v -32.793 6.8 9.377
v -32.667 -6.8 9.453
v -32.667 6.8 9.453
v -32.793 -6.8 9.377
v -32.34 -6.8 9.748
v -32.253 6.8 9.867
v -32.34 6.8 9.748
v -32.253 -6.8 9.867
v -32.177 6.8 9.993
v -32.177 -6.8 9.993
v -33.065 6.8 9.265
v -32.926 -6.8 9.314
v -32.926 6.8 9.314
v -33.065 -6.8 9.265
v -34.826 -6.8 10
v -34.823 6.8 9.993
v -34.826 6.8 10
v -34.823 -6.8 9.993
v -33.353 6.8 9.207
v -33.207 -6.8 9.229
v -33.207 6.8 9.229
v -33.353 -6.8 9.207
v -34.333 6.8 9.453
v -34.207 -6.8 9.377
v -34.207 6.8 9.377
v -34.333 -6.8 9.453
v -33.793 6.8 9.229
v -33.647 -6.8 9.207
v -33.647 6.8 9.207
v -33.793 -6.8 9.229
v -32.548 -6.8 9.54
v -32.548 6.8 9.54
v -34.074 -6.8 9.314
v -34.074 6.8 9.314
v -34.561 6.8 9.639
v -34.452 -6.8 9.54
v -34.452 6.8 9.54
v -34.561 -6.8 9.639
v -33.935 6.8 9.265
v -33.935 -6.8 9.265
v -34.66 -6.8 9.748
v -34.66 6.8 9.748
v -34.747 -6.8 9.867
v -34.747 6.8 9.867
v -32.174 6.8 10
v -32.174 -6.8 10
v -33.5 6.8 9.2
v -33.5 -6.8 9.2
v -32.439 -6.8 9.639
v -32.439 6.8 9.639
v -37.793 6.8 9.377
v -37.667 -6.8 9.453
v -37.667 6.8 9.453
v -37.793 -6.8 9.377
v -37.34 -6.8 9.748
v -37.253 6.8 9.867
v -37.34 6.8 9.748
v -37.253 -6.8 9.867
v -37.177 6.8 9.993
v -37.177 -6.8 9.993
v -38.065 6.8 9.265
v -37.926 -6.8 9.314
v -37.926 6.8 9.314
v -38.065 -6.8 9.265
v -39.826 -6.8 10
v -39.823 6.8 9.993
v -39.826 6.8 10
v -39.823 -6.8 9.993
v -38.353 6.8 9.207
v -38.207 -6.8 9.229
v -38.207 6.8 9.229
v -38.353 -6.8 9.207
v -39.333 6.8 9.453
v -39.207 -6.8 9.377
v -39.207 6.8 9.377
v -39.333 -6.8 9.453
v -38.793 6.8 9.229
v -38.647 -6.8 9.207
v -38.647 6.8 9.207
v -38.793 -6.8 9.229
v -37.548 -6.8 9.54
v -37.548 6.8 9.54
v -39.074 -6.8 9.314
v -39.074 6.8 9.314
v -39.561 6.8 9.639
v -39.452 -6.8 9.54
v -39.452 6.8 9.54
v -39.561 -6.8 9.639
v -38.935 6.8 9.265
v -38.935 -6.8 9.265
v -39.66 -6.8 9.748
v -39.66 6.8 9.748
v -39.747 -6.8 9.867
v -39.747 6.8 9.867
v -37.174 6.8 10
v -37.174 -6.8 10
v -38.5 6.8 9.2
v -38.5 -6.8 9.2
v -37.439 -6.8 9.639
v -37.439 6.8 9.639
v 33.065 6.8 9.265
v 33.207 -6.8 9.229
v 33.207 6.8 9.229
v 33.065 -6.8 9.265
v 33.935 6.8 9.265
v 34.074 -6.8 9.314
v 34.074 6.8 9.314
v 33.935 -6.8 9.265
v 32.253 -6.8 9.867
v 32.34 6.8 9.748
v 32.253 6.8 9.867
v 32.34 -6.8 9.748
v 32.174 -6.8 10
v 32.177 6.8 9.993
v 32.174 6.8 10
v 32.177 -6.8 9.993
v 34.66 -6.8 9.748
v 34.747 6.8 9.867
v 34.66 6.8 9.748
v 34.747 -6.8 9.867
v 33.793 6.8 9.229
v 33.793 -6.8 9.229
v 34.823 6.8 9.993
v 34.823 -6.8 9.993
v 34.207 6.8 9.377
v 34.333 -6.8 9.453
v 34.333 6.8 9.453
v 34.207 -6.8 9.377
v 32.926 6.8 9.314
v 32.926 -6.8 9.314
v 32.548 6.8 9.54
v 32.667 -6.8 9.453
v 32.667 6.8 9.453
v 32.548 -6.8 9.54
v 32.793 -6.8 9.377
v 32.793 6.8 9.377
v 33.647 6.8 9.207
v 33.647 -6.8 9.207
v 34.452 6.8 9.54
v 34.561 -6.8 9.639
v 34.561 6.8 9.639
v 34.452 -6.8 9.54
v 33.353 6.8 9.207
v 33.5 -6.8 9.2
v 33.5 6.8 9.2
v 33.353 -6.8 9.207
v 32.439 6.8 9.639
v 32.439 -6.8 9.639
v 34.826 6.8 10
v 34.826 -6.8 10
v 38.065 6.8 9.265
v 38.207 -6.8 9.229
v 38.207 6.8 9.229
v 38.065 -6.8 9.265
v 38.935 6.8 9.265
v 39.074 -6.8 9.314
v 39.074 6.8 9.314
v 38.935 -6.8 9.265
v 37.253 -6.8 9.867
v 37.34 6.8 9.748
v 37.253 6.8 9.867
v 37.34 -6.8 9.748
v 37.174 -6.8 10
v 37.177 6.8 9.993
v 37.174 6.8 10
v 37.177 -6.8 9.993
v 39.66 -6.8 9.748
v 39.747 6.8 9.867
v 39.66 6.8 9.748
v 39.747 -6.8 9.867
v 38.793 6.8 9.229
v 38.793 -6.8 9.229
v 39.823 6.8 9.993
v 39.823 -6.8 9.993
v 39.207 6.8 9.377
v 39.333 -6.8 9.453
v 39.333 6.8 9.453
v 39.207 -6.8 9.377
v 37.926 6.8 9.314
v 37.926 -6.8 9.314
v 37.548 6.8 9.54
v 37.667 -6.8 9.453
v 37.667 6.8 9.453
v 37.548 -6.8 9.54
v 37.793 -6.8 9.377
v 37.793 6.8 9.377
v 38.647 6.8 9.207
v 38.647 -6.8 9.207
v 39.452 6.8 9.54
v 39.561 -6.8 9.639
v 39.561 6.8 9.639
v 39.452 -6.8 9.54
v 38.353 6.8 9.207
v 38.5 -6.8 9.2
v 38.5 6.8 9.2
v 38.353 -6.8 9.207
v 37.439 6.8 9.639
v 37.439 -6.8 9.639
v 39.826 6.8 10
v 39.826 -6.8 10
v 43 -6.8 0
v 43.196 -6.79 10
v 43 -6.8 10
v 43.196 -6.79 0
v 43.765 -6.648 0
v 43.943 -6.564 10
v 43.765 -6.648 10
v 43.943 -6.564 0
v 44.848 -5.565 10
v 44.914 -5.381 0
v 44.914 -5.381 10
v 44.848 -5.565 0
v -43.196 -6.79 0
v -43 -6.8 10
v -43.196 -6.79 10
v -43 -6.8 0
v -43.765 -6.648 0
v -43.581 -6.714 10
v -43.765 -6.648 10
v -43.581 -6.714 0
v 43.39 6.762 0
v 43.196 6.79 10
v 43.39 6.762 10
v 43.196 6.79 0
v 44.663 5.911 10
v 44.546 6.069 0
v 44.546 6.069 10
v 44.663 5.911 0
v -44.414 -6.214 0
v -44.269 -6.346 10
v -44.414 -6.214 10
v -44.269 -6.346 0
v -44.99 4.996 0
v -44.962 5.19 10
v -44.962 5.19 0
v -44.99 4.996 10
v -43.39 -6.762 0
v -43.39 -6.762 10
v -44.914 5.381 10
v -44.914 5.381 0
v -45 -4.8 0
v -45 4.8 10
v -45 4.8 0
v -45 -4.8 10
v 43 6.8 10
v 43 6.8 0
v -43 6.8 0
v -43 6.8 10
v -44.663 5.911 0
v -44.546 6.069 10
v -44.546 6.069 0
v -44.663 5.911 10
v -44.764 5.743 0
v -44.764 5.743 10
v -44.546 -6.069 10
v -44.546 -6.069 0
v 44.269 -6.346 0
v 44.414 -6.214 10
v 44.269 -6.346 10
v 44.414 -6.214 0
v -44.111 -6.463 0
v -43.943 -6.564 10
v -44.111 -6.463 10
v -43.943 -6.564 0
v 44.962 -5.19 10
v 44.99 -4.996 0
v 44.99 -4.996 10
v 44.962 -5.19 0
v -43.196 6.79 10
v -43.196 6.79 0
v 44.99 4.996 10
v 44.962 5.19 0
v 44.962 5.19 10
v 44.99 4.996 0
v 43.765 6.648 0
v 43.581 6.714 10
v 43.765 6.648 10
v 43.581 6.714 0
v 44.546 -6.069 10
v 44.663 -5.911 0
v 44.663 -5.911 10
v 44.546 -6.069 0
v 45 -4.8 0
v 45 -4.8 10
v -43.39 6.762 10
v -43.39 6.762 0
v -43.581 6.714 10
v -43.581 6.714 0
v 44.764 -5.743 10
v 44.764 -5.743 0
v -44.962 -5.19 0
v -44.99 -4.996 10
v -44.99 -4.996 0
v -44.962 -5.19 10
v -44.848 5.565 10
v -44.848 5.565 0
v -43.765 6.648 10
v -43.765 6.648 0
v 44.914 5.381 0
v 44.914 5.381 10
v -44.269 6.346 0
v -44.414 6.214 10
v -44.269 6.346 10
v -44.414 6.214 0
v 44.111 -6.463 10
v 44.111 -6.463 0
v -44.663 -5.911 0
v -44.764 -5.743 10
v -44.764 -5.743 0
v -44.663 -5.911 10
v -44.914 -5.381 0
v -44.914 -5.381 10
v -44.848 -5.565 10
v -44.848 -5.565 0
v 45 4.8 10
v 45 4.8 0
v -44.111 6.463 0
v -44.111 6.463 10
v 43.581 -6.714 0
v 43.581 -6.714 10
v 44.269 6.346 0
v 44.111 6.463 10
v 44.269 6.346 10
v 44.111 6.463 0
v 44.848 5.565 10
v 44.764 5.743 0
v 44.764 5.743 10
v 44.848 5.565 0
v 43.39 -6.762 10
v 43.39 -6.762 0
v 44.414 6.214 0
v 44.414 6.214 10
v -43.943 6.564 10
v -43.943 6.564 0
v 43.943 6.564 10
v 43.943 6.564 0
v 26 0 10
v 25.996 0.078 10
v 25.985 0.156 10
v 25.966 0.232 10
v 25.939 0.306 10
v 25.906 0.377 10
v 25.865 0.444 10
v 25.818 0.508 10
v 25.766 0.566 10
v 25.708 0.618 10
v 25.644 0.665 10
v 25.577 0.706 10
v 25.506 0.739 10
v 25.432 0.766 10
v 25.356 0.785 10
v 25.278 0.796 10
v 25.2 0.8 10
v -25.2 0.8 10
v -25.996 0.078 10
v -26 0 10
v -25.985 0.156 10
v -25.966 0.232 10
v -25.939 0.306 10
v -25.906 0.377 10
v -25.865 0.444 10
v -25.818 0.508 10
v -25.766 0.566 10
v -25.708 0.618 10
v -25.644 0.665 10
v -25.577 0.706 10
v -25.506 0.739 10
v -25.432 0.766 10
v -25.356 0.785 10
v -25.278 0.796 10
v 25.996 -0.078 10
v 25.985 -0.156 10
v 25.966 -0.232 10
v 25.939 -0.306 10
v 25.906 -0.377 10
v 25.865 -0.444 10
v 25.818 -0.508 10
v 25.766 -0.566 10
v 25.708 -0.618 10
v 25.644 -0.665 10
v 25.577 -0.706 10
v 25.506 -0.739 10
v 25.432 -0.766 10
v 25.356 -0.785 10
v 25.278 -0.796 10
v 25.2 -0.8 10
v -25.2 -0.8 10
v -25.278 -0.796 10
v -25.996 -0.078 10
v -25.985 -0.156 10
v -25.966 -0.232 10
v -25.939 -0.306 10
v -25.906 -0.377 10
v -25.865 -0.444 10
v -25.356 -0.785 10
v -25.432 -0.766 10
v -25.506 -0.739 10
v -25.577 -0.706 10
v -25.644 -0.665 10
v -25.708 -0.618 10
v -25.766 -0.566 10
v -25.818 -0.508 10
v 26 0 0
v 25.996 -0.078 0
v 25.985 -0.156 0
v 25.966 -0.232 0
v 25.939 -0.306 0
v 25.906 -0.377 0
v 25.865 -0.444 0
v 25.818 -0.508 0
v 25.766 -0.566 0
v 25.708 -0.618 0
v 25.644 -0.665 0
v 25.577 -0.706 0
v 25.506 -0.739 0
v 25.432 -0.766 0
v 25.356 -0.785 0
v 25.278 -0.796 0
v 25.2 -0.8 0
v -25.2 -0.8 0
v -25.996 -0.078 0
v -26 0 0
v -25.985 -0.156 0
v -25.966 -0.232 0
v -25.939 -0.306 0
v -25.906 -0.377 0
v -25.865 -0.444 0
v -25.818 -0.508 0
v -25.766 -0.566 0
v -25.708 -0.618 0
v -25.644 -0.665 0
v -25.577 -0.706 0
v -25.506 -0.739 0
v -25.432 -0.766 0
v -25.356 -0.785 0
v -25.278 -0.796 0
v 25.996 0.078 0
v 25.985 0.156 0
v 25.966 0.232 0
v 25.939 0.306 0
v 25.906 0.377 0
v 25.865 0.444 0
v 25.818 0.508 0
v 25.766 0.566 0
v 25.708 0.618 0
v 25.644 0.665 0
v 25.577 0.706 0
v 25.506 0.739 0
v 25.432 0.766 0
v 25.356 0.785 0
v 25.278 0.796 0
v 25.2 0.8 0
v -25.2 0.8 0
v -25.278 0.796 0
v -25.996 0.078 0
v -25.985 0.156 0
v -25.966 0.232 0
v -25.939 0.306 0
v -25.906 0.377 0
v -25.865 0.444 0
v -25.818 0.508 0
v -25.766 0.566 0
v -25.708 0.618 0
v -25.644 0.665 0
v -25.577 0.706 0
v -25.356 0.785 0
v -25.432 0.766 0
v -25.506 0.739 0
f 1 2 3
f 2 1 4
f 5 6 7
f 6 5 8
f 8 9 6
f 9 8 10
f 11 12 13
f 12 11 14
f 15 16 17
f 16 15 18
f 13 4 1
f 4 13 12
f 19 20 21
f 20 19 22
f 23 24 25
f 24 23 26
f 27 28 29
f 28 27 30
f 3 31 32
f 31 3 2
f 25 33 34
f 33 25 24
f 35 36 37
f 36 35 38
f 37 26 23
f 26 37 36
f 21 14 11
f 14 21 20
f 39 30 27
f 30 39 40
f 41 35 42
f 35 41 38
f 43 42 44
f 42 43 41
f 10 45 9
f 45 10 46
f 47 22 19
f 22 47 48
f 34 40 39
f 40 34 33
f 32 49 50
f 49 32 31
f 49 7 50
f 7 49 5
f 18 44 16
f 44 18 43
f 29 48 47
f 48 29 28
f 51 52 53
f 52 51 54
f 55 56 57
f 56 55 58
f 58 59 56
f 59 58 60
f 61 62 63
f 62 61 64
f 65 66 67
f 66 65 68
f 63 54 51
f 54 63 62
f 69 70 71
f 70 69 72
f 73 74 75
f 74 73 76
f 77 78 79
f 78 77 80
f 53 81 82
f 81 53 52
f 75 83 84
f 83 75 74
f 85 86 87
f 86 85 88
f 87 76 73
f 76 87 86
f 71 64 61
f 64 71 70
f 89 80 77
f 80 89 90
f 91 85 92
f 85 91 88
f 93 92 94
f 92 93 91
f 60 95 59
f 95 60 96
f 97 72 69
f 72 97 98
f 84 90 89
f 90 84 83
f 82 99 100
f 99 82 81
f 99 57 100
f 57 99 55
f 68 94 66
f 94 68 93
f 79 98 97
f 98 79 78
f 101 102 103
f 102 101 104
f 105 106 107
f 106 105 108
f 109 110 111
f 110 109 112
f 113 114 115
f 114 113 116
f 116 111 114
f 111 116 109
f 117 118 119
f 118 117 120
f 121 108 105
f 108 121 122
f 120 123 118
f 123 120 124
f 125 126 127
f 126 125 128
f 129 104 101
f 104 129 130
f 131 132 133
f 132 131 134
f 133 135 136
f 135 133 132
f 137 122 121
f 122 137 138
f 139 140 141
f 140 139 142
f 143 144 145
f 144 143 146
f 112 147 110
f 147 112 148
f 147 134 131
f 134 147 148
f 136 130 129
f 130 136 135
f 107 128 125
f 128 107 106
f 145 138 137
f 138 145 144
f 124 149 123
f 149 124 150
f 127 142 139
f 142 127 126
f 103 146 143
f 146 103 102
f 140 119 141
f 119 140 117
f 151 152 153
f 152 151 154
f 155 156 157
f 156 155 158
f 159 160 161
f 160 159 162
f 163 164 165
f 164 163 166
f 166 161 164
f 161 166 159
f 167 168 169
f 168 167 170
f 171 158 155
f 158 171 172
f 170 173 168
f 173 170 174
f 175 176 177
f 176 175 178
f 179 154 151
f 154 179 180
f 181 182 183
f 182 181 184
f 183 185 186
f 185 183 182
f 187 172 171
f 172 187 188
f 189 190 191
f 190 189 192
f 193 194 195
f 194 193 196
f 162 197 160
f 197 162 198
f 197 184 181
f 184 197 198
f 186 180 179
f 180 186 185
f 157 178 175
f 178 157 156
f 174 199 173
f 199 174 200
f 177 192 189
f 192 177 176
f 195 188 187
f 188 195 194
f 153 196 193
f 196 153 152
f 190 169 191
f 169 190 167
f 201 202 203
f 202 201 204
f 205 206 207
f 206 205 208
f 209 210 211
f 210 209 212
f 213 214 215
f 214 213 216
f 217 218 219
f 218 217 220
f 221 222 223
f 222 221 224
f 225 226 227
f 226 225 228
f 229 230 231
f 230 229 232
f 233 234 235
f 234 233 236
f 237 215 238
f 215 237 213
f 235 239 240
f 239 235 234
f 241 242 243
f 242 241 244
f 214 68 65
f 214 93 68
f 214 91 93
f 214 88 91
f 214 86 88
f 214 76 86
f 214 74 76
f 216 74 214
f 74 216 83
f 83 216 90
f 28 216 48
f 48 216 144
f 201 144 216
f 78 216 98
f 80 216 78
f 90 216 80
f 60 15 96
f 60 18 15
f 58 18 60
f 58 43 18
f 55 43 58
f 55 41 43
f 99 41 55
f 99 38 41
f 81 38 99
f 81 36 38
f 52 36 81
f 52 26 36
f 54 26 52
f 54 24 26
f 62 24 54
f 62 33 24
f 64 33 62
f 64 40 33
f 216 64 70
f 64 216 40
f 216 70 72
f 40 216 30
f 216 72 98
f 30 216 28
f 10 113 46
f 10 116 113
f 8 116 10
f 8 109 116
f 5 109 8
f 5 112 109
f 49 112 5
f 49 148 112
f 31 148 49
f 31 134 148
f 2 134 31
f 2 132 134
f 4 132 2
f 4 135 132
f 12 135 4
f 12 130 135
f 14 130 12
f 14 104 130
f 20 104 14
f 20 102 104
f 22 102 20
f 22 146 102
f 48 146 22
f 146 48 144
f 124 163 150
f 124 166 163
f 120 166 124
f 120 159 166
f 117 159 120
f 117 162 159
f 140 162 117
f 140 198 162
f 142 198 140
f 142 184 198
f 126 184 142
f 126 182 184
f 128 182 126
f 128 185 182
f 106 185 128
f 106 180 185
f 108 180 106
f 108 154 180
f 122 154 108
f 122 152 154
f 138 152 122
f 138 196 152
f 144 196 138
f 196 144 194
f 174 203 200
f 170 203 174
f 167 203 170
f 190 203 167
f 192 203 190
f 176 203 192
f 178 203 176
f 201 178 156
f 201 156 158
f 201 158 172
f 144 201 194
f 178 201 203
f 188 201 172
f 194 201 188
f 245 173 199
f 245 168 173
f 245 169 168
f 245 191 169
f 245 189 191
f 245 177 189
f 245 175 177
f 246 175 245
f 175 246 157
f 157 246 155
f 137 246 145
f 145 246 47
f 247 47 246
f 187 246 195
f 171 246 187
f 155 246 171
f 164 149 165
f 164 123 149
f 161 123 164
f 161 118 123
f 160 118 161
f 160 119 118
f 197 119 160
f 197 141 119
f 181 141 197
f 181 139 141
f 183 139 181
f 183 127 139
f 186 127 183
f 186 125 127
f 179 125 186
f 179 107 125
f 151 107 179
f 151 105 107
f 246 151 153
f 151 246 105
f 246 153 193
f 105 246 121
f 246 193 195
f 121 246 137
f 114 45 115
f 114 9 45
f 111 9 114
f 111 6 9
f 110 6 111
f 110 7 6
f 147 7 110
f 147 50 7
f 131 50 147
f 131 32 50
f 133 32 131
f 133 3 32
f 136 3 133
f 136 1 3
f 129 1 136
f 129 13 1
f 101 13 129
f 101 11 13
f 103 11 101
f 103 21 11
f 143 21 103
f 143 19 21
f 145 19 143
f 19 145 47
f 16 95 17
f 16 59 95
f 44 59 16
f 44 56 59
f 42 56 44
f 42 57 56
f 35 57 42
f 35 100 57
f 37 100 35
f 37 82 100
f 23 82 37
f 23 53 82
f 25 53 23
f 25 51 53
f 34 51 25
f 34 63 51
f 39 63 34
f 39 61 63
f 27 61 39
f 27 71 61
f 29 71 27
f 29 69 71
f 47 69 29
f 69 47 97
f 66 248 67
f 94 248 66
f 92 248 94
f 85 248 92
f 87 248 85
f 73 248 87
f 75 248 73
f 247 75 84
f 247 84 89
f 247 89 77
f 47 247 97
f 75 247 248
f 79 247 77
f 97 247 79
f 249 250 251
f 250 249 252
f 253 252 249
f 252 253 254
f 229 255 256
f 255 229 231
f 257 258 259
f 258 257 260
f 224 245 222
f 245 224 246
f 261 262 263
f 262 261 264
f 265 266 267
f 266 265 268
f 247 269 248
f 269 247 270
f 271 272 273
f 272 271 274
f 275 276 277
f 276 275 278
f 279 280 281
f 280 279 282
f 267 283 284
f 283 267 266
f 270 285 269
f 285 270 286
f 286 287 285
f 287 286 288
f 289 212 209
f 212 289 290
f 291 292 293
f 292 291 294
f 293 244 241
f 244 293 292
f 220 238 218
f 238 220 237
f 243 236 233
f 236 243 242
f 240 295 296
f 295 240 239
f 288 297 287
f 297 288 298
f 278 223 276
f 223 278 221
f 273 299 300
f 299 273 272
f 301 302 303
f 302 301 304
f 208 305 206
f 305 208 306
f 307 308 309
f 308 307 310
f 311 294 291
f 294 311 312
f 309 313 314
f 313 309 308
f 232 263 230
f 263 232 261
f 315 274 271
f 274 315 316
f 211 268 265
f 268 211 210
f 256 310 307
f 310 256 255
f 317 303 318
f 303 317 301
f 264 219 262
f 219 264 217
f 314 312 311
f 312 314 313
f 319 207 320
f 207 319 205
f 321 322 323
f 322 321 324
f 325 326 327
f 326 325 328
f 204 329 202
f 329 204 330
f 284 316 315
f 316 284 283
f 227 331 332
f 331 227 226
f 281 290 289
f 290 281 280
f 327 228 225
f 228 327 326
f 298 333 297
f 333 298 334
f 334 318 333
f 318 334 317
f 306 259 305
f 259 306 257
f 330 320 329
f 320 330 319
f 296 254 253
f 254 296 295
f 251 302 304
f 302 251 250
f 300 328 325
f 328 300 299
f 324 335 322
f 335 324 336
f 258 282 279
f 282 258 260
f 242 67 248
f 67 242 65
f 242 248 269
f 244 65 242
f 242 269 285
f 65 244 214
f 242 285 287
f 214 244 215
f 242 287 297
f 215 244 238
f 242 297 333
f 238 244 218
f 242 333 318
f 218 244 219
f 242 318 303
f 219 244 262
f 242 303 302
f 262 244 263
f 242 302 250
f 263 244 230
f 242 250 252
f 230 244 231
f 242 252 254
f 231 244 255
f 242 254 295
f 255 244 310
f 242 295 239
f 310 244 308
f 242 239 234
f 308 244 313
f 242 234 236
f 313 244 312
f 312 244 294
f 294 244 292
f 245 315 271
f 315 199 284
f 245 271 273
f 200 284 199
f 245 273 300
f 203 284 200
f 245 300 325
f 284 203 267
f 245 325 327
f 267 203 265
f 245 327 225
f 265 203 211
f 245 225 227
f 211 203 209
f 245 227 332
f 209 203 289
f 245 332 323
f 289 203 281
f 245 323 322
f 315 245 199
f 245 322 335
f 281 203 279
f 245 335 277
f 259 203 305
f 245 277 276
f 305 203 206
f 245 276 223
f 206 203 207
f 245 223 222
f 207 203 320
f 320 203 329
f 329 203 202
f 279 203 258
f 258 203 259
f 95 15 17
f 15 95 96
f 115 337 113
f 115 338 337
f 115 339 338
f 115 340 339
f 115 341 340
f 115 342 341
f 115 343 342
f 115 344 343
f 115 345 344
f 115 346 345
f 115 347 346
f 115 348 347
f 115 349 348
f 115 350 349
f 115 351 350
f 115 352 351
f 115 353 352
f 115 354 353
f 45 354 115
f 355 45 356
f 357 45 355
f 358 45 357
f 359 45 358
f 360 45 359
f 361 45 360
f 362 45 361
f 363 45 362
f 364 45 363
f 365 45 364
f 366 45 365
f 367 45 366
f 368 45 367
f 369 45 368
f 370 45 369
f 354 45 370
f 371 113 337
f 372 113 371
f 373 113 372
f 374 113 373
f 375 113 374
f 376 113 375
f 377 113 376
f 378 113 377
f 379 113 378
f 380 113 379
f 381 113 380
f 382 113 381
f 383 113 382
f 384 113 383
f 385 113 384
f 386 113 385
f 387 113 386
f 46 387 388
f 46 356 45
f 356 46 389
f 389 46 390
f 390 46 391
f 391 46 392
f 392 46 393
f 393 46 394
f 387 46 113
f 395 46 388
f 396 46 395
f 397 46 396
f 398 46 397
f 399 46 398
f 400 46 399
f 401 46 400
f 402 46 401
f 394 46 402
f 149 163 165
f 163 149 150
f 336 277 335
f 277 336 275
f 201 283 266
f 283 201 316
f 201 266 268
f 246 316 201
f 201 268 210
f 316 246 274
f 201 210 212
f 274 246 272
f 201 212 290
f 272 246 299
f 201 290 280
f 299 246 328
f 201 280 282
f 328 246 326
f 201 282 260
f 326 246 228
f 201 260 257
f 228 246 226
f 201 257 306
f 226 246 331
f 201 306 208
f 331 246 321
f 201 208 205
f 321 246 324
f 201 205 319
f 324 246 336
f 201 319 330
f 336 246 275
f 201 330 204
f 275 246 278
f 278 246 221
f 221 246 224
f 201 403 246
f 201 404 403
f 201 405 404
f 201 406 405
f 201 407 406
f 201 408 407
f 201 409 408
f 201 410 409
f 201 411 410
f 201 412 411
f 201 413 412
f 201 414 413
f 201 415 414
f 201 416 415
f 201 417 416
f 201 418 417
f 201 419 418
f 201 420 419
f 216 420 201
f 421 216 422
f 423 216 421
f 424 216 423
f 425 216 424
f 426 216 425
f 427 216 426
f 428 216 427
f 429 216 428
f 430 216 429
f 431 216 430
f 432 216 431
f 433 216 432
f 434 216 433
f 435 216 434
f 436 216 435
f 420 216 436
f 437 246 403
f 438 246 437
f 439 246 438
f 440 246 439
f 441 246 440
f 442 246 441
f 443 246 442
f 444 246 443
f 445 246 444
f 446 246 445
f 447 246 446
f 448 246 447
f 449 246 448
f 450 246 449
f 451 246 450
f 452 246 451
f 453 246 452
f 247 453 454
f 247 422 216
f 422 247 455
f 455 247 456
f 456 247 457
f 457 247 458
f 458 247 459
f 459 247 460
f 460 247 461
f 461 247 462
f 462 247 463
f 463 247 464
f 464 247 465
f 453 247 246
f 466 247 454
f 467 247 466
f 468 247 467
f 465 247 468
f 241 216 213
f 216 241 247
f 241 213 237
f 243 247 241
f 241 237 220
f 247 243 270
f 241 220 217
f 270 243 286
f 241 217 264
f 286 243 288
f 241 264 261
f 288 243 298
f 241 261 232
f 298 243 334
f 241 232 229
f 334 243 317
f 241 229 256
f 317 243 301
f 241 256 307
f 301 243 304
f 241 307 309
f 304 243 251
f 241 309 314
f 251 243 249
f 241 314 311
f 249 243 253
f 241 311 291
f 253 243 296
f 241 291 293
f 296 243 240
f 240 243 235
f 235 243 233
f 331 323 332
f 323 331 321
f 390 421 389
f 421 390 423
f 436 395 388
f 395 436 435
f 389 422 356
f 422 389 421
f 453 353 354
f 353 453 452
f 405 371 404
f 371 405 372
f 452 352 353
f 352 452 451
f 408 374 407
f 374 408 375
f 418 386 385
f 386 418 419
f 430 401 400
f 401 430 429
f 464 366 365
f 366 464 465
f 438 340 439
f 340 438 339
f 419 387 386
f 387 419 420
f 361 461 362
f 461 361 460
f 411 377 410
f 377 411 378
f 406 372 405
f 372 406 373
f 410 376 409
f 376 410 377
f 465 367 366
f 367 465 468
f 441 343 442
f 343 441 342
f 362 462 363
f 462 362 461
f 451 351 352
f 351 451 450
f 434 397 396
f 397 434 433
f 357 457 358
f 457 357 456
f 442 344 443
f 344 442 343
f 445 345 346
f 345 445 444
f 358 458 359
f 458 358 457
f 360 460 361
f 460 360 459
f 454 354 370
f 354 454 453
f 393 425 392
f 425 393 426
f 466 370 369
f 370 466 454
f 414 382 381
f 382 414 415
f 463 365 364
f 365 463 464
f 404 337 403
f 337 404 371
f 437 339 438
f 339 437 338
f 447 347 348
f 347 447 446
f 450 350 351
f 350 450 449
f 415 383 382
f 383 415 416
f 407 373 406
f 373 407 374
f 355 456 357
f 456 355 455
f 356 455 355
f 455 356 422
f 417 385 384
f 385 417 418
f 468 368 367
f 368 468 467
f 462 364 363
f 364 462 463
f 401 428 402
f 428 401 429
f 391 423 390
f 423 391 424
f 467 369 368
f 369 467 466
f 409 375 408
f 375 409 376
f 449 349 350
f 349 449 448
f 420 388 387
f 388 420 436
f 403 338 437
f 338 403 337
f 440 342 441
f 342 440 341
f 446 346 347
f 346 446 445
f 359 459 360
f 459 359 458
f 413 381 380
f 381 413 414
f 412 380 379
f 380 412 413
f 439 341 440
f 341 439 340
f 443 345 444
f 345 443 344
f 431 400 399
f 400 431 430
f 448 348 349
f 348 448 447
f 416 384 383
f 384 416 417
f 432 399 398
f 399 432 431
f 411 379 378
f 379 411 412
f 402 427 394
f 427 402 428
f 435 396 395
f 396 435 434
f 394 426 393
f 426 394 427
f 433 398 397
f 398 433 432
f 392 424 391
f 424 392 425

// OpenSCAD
// Tube squeezer — a bar with a narrow slot that the crimped end of a tube
// (toothpaste, lotion, paint, glue) is fed through, then slid along the tube
// to press the contents towards the cap.
//
// Printed flat: the slot runs straight down through the bar, so its walls are
// vertical and nothing needs support. The ends of the slot are rounded so the
// tube's folded edges are not cut by a corner.
//
// Styles:
//   closed    the slot is enclosed; thread the tube's flat end through it
//   open_end  the slot runs out through one end, so the squeezer slips on
//             from the side of a tube that is already half used
//
// The colour parameters are the extruder order: body_color is extruder 1,
// label_color extruder 2.

/* [Tube] */

// Width of the tube when flattened (measure the crimped end), mm
tube_width = 50; // [15:1:120]

// Slot gap, mm: about twice the tube's wall. Narrower squeezes harder
slot_gap = 1.6; // [0.6:0.1:5]

// Extra slot length beyond the tube's width, each end, mm
clearance = 1; // [0:0.5:5]

/* [Body] */

// Slot style
style = "closed"; // [closed:Closed slot, open_end:Open at one end]

// Height of the bar (how much of the tube it presses at once), mm
height = 10; // [5:1:25]

// Thickness of each jaw beside the slot, mm (stiffer when thicker)
jaw = 6; // [3:0.5:15]

// Length of the grip wing at each end, mm (0 for none)
wing = 15; // [0:1:40]

// Finger grooves across the top of each wing
grooves = true;

/* [Label] */

// Text inlaid flush into the top face, along one jaw. Empty for none
label = ""; // 16

// Typeface for the label
font = "DejaVu Sans:style=Bold"; // font

/* [Colors] */

// Bar (extruder 1)
body_color = "#3A7BD5"; // color

// Label (extruder 2)
label_color = "#FFFFFF"; // color

/* [Hidden] */

$fn = 64;

end_wall = 4;            // solid bar beyond each end of a closed slot
corner_r = 2;            // rounded corners of the bar in plan
groove_d = 3;            // finger groove width
groove_depth = 0.8;
groove_pitch = 5;
inlay = 0.6;
eps = 0.01;

slot_len = tube_width + 2 * clearance;
bar_w = slot_gap + 2 * jaw;                       // across the slot (Y)
bar_l = slot_len + 2 * end_wall + 2 * wing;       // along the slot (X)
label_h = min(jaw * 0.7, 8);                      // letter height
label_y = slot_gap / 2 + jaw / 2;                 // centre of the +Y jaw
label_len = slot_len - 2;                         // fits along the slot

// Plan of the bar: a rounded rectangle centred on the origin.
module bar_2d() {
    offset(r = corner_r) square([bar_l - 2 * corner_r, bar_w - 2 * corner_r], center = true);
}

// The slot, with ends rounded to the gap. open_end extends it out through +X.
module slot_2d() {
    hull() {
        translate([-slot_len / 2 + slot_gap / 2, 0]) circle(d = slot_gap);
        translate([slot_len / 2 - slot_gap / 2, 0]) circle(d = slot_gap);
    }
    if (style == "open_end")
        translate([0, -slot_gap / 2]) square([bar_l, slot_gap]);
}

// Finger grooves: half-round channels across each wing's top face.
module grooves_3d() {
    n = floor((wing - 2) / groove_pitch);
    if (grooves && n > 0)
        for (side = [-1, 1], i = [0 : n - 1]) {
            x = side * (slot_len / 2 + end_wall + 1 + groove_pitch / 2 + i * groove_pitch);
            translate([x, 0, height + groove_d / 2 - groove_depth])
                rotate([90, 0, 0]) cylinder(d = groove_d, h = bar_w + 2, center = true);
        }
}

// Shrink-only fit along X, as in models/cable-grommet: resize() the text plus
// a hair-thin bar of the target length, so short text is left alone.
module fit_x(w) {
    projection(cut = true) translate([0, 0, -0.5])
        resize([w, 0, 0], auto = [false, true, false])
            union() {
                linear_extrude(1) children();
                translate([-w / 2, 0, 10]) cube([w, 0.01, 0.01]);
            }
}

module label_2d() {
    translate([0, label_y])
        fit_x(label_len)
            text(label, size = label_h, font = font, halign = "center", valign = "center");
}

module label_3d(extra = 0) {
    translate([0, 0, height - inlay]) linear_extrude(height = inlay + extra) label_2d();
}

has_label = len(label) > 0;

color(body_color) difference() {
    linear_extrude(height = height) bar_2d();
    translate([0, 0, -eps]) linear_extrude(height = height + 2 * eps) slot_2d();
    grooves_3d();
    if (has_label) label_3d(eps);
}
if (has_label) color(label_color) label_3d();
